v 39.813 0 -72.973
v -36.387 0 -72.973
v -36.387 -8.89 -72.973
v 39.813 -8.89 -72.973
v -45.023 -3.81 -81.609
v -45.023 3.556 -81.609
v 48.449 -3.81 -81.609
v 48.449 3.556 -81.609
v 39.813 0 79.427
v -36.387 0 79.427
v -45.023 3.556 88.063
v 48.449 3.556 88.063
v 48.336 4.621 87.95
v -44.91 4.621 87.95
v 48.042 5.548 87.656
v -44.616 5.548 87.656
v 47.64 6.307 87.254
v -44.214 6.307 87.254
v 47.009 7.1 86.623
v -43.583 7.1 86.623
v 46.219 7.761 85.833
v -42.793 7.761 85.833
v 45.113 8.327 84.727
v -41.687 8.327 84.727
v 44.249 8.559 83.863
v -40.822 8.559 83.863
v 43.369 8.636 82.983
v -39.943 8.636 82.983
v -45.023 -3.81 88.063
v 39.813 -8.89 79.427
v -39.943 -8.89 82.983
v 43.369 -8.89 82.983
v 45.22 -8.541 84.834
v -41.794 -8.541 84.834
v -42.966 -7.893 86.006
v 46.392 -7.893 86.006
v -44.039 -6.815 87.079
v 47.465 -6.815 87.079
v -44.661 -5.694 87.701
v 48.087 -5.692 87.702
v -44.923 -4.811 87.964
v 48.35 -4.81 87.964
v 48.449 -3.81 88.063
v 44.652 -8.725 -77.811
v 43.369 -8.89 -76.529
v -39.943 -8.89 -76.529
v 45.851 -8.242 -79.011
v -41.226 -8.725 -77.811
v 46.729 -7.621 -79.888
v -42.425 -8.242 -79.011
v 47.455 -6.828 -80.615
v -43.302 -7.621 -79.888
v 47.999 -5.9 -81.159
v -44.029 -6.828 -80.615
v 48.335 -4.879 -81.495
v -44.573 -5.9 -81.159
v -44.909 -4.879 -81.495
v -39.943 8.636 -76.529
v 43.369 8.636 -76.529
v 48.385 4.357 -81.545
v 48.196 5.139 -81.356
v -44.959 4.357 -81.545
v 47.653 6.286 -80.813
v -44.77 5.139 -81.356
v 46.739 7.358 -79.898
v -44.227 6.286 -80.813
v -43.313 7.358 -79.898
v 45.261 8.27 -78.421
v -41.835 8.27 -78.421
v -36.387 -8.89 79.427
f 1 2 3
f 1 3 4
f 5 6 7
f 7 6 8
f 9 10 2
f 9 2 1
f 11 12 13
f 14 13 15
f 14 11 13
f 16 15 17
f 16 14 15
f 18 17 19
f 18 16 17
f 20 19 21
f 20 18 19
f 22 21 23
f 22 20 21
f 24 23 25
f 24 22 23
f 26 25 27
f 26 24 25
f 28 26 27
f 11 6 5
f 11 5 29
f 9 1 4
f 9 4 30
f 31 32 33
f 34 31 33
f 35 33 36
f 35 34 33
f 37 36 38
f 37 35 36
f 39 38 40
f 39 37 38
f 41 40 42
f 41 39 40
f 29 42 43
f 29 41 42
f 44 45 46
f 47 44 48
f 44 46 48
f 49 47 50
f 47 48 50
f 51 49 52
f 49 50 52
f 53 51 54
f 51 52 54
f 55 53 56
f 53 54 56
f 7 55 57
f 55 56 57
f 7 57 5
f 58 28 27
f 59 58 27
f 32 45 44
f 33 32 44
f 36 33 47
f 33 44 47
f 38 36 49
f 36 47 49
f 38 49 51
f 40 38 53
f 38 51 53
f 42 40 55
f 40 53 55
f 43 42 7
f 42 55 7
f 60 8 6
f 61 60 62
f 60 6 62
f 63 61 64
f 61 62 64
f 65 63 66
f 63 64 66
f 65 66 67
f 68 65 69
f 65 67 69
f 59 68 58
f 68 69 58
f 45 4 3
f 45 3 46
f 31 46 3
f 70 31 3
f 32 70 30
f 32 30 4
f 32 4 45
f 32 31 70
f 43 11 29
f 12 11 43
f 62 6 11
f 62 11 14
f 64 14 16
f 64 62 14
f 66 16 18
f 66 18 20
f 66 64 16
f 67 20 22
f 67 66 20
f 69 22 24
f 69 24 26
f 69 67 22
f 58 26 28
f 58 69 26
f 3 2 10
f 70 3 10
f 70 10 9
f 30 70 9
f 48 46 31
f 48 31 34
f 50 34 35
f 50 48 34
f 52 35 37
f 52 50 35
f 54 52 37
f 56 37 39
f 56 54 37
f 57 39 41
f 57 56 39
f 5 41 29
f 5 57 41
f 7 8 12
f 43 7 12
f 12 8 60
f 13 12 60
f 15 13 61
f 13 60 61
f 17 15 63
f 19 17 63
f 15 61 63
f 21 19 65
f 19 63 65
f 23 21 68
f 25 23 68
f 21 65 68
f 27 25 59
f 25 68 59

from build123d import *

# Parameters (mm, degrees)
F0_W        = 76.2
F0_H        = 152.4
F1_DEPTH    = 8.89
F2_T        = 8.636
F3_T1_DEPTH = 118.872
F3_T3_DEPTH = 195.072


# Not quite as in the source:
# - a fillet or chamfer that OpenCascade refuses, or shapes differently, is made with other operations: its cross-section is extruded or revolved along the edge and cut away or added


with BuildPart() as f1:
    # F0 (on Front) → F1 (new body)
    with BuildSketch(Plane.XZ):
        with Locations((1.7131138593, 3.2272135141)):
            Rectangle(F0_W, F0_H)
    extrude(amount=F1_DEPTH)

    # F2
    f2_openings = [f1.faces().sort_by_distance(p)[0] for p in [
        (1.713114, -8.89, 3.227214),
    ]]
    offset(amount=F2_T, openings=f2_openings, kind=Kind.INTERSECTION)

    # F3: fillet of radius 5.08 on 8 edges, made by hand

    # F3_s2 → F3_t1 (cut)
    with BuildSketch(Plane.YZ.offset(-57.7228861407)):
        with BuildLine():
            ThreePointArc((-8.89, -76.5287864859), (-7.4021024484, -80.1208889343), (-3.81, -81.6087864859))
            Line((-3.81, -81.6087864859), (-8.89, -81.6087864859))
            Line((-8.89, -81.6087864859), (-8.89, -76.5287864859))
        make_face()
        with BuildLine():
            ThreePointArc((-8.89, 82.9832135141), (-7.4021024484, 86.5753159626), (-3.81, 88.0632135141))
            Line((-3.81, 88.0632135141), (-8.89, 88.0632135141))
            Line((-8.89, 88.0632135141), (-8.89, 82.9832135141))
        make_face()
        with BuildLine():
            ThreePointArc((3.556, 88.0632135141), (7.1481024484, 86.5753159626), (8.636, 82.9832135141))
            Line((8.636, 82.9832135141), (8.636, 88.0632135141))
            Line((8.636, 88.0632135141), (3.556, 88.0632135141))
        make_face()
        with BuildLine():
            ThreePointArc((3.556, -81.6087864859), (7.1481024484, -80.1208889343), (8.636, -76.5287864859))
            Line((8.636, -76.5287864859), (8.636, -81.6087864859))
            Line((8.636, -81.6087864859), (3.556, -81.6087864859))
        make_face()
    extrude(amount=F3_T1_DEPTH, mode=Mode.SUBTRACT)

    # F3_s4 → F3_t3 (cut)
    with BuildSketch(Plane.XY.offset(-94.3087864859)):
        with BuildLine():
            ThreePointArc((43.3691138593, -8.89), (46.9612163077, -7.4021024484), (48.4491138593, -3.81))
            Line((48.4491138593, -3.81), (48.4491138593, -8.89))
            Line((48.4491138593, -8.89), (43.3691138593, -8.89))
        make_face()
        with BuildLine():
            ThreePointArc((-39.9428861407, -8.89), (-43.5349885891, -7.4021024484), (-45.0228861407, -3.81))
            Line((-45.0228861407, -3.81), (-45.0228861407, -8.89))
            Line((-45.0228861407, -8.89), (-39.9428861407, -8.89))
        make_face()
        with BuildLine():
            ThreePointArc((-45.0228861407, 3.556), (-43.5349885891, 7.1481024484), (-39.9428861407, 8.636))
            Line((-39.9428861407, 8.636), (-45.0228861407, 8.636))
            Line((-45.0228861407, 8.636), (-45.0228861407, 3.556))
        make_face()
        with BuildLine():
            ThreePointArc((48.4491138593, 3.556), (46.9612163077, 7.1481024484), (43.3691138593, 8.636))
            Line((43.3691138593, 8.636), (48.4491138593, 8.636))
            Line((48.4491138593, 8.636), (48.4491138593, 3.556))
        make_face()
    extrude(amount=F3_T3_DEPTH, mode=Mode.SUBTRACT)


solid = f1.part
